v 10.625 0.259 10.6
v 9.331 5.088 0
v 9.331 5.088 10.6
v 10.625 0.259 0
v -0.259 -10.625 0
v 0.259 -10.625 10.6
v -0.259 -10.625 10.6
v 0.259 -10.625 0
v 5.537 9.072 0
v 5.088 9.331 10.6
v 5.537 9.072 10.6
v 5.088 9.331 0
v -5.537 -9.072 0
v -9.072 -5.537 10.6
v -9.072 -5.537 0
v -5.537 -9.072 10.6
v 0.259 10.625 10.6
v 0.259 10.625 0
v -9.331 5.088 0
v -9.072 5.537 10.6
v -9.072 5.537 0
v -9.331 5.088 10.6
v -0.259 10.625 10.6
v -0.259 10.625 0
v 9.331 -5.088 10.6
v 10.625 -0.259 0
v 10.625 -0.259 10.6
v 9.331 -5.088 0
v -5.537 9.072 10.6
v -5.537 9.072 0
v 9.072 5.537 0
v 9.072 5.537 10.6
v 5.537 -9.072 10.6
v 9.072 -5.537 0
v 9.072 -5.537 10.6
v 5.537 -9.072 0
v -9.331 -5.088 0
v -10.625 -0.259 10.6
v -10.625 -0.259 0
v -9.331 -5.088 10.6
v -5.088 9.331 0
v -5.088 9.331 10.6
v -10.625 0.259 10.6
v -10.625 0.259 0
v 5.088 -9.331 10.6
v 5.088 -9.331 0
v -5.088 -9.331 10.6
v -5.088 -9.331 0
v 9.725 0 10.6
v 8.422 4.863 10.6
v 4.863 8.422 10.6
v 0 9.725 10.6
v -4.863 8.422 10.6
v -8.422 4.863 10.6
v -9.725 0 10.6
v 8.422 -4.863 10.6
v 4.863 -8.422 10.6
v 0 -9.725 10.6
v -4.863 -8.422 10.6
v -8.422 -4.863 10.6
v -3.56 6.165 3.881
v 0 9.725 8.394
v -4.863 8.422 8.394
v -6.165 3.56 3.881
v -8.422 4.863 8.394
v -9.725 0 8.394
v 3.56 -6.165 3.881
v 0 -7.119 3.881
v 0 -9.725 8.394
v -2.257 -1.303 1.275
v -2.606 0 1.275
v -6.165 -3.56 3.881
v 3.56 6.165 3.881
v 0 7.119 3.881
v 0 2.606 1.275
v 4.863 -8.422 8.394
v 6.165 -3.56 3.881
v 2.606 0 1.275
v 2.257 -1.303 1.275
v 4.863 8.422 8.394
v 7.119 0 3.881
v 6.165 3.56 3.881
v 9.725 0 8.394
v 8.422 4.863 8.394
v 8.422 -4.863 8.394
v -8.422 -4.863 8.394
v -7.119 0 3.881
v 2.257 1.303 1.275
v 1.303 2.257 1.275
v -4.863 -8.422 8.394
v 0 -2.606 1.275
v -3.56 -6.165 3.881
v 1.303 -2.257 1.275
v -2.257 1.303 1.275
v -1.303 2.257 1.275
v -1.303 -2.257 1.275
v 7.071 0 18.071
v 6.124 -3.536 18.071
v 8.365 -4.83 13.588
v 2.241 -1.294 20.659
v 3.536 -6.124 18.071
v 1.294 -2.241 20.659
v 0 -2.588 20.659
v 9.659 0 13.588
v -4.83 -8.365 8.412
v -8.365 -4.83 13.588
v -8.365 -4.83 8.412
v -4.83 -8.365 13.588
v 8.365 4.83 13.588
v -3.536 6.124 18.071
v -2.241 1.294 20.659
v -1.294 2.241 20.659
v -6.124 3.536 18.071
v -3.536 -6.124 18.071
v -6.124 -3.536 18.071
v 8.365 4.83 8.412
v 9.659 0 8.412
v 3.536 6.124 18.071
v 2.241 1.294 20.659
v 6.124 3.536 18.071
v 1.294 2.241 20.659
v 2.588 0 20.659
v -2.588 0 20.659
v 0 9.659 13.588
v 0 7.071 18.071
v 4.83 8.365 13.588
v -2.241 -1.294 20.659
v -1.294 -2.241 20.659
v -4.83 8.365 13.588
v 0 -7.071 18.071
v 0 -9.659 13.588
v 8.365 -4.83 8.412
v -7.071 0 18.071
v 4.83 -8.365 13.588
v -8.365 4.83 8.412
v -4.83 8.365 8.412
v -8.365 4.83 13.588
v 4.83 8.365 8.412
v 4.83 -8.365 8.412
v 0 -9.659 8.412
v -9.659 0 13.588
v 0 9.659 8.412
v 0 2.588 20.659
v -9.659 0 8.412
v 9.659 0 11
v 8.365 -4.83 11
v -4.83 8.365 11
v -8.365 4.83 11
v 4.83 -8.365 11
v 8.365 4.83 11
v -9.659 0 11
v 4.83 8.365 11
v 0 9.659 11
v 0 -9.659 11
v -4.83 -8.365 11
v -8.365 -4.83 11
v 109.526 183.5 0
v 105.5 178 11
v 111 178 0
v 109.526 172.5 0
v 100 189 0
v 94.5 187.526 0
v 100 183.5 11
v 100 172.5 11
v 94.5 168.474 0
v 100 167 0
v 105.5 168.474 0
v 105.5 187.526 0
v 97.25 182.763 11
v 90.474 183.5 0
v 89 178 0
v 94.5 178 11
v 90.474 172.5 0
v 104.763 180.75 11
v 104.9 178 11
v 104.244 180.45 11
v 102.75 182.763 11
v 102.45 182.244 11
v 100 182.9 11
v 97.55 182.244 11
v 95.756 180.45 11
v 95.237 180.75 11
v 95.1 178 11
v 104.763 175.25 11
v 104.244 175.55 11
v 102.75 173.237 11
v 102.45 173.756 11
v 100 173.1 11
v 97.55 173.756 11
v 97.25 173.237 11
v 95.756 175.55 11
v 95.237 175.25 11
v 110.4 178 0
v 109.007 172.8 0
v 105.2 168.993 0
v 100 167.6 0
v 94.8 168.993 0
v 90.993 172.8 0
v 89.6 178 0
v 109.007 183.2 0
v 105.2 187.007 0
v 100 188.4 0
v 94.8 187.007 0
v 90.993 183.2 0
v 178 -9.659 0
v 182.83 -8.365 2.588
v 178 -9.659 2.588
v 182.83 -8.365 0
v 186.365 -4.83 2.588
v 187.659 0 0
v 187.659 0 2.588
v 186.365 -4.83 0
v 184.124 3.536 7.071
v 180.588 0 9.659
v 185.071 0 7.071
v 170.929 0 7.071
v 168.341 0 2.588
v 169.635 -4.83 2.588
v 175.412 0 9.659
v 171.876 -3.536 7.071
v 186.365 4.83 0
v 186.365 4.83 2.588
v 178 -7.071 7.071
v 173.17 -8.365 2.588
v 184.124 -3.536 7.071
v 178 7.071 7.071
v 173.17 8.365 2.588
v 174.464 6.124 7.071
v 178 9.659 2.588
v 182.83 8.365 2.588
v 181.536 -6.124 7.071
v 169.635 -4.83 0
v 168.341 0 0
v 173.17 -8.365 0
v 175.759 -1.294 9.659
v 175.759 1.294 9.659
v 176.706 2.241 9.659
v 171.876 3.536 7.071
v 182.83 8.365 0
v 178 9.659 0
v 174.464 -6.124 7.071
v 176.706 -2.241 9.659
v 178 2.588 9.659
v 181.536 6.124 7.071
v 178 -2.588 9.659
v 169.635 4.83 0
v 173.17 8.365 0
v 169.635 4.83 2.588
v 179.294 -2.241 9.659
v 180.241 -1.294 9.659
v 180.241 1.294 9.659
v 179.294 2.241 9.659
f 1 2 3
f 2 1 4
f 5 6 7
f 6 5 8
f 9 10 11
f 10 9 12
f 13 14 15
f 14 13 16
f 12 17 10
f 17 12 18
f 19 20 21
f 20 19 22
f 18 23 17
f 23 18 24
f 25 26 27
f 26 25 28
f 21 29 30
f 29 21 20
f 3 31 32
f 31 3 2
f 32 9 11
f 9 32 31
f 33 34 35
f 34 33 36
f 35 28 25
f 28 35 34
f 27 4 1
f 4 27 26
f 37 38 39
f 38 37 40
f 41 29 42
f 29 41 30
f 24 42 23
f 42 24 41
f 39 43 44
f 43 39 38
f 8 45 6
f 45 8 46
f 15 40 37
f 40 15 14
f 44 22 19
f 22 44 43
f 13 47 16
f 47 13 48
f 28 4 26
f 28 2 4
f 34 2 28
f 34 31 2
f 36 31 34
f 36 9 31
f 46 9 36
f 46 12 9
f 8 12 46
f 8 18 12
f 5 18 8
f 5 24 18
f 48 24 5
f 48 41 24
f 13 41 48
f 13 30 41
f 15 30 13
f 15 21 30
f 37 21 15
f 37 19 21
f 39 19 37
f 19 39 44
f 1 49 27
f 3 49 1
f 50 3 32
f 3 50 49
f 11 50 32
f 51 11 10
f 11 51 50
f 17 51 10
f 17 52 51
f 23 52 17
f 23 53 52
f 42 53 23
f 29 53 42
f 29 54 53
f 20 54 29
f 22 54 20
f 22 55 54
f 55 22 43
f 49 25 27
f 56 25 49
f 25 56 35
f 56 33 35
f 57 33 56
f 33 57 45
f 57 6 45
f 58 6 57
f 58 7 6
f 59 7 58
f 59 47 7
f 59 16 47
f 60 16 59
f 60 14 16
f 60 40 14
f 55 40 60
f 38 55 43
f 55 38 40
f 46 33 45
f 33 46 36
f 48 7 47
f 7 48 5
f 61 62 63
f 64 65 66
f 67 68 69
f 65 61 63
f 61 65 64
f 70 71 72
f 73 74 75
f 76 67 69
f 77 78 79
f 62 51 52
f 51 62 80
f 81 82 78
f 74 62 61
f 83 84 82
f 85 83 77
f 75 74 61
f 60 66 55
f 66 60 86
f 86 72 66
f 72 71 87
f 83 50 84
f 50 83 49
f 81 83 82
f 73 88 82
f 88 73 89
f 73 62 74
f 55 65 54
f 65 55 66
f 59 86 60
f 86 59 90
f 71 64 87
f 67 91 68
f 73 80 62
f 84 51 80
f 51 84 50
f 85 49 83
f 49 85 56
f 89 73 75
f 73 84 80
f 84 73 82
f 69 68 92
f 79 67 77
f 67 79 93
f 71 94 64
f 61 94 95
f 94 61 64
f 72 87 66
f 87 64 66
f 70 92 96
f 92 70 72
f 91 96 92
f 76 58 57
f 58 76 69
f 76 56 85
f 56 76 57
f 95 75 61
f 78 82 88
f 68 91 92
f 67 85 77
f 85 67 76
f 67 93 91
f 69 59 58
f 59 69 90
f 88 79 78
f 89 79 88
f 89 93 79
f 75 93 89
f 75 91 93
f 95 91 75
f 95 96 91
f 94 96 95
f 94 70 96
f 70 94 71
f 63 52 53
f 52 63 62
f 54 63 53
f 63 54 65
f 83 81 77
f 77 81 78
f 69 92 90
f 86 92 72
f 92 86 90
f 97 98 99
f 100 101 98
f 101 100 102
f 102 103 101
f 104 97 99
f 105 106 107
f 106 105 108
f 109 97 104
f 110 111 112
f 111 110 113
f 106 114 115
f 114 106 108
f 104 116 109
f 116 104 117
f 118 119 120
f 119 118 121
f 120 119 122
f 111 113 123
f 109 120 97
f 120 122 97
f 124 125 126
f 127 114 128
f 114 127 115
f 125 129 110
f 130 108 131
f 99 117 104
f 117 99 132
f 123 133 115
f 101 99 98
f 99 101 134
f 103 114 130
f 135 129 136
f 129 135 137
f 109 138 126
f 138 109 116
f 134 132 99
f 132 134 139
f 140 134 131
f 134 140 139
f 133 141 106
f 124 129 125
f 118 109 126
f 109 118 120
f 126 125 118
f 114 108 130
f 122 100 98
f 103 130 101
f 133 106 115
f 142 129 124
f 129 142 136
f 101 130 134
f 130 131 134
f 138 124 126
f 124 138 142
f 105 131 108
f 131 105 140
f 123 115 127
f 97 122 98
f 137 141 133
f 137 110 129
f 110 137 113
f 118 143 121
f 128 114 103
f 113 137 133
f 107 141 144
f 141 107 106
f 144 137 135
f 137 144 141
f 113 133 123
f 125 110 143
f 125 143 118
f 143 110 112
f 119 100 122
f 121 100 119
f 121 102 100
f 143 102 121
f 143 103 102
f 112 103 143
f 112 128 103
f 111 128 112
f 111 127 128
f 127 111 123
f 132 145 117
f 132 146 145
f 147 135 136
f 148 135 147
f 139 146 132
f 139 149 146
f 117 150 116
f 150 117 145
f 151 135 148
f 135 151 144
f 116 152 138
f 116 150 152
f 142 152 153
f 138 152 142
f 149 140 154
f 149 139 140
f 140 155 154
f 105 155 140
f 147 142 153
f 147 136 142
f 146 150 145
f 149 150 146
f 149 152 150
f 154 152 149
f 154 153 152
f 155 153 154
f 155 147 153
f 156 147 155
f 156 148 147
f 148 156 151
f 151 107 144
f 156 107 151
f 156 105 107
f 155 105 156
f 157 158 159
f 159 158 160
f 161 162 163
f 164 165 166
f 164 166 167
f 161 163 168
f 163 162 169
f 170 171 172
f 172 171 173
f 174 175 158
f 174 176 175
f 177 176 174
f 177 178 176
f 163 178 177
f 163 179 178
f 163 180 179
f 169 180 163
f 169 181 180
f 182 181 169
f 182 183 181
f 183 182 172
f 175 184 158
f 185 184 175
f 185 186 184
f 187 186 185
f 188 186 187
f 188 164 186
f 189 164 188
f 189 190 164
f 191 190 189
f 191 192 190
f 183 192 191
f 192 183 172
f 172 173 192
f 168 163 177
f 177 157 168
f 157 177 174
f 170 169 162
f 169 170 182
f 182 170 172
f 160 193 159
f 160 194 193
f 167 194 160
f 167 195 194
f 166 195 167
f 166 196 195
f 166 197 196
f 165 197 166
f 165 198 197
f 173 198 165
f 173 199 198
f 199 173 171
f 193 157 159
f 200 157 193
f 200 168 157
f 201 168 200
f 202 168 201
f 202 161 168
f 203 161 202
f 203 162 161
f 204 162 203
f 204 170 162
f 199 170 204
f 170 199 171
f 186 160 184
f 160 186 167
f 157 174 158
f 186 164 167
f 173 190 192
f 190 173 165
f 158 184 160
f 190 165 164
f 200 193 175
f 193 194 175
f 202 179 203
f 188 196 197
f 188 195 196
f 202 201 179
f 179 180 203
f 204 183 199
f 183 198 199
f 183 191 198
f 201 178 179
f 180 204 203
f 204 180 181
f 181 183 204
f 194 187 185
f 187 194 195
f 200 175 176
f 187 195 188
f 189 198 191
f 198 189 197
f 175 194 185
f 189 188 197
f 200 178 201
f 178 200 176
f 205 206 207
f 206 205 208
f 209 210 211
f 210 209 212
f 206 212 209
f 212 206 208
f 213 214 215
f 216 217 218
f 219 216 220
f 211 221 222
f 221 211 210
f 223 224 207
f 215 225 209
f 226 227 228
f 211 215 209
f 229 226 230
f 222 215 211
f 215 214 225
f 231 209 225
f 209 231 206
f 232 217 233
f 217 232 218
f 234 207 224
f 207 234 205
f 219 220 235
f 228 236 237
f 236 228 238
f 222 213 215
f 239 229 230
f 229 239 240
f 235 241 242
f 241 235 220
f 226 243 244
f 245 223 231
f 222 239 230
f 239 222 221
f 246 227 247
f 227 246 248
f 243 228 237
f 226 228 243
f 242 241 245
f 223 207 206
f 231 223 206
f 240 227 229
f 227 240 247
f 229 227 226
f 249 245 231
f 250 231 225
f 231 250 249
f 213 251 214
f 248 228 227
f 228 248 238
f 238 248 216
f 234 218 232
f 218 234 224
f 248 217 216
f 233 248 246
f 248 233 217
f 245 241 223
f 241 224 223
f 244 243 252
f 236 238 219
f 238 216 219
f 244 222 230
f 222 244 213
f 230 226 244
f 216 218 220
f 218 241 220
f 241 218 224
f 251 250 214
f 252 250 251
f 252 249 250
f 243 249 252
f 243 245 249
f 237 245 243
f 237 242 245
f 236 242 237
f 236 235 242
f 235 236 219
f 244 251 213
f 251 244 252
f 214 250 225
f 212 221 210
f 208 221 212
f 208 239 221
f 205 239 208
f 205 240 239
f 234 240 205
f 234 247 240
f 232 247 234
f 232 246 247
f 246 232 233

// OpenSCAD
r=11;
slop=.15;
wall_thickness=1;
$fn=12;
//from https://thangs.com/designer/varmfskii/3d-model/d120-876447
module a() sphere(10);
module b() hull() a();

//translate([0,0,h]) %a();

//holder
difference(){
  linear_extrude(r-.4) offset(wall_thickness) projection() b();
  //die with slop
  translate([0,0,r]) scale((r+slop/2)/(r)) b();
}
//top half
translate([0,0,r]) render() difference(){
  scale(1) a();
  mirror([0,0,1]) linear_extrude(r) projection() b();
}
//cone of go away
translate([200/2,200-2*r,0]) render() difference(){
  cylinder(r1=r,r2=r/2,h=r);
  cylinder(r1=r-.6,r2=r/2-.6,h=r);
}
//bottom half
translate([200 - 2*r,0,0]) rotate([180,0,0]) render() difference(){
  a();
  linear_extrude(r) offset(.1) projection() b();
}
